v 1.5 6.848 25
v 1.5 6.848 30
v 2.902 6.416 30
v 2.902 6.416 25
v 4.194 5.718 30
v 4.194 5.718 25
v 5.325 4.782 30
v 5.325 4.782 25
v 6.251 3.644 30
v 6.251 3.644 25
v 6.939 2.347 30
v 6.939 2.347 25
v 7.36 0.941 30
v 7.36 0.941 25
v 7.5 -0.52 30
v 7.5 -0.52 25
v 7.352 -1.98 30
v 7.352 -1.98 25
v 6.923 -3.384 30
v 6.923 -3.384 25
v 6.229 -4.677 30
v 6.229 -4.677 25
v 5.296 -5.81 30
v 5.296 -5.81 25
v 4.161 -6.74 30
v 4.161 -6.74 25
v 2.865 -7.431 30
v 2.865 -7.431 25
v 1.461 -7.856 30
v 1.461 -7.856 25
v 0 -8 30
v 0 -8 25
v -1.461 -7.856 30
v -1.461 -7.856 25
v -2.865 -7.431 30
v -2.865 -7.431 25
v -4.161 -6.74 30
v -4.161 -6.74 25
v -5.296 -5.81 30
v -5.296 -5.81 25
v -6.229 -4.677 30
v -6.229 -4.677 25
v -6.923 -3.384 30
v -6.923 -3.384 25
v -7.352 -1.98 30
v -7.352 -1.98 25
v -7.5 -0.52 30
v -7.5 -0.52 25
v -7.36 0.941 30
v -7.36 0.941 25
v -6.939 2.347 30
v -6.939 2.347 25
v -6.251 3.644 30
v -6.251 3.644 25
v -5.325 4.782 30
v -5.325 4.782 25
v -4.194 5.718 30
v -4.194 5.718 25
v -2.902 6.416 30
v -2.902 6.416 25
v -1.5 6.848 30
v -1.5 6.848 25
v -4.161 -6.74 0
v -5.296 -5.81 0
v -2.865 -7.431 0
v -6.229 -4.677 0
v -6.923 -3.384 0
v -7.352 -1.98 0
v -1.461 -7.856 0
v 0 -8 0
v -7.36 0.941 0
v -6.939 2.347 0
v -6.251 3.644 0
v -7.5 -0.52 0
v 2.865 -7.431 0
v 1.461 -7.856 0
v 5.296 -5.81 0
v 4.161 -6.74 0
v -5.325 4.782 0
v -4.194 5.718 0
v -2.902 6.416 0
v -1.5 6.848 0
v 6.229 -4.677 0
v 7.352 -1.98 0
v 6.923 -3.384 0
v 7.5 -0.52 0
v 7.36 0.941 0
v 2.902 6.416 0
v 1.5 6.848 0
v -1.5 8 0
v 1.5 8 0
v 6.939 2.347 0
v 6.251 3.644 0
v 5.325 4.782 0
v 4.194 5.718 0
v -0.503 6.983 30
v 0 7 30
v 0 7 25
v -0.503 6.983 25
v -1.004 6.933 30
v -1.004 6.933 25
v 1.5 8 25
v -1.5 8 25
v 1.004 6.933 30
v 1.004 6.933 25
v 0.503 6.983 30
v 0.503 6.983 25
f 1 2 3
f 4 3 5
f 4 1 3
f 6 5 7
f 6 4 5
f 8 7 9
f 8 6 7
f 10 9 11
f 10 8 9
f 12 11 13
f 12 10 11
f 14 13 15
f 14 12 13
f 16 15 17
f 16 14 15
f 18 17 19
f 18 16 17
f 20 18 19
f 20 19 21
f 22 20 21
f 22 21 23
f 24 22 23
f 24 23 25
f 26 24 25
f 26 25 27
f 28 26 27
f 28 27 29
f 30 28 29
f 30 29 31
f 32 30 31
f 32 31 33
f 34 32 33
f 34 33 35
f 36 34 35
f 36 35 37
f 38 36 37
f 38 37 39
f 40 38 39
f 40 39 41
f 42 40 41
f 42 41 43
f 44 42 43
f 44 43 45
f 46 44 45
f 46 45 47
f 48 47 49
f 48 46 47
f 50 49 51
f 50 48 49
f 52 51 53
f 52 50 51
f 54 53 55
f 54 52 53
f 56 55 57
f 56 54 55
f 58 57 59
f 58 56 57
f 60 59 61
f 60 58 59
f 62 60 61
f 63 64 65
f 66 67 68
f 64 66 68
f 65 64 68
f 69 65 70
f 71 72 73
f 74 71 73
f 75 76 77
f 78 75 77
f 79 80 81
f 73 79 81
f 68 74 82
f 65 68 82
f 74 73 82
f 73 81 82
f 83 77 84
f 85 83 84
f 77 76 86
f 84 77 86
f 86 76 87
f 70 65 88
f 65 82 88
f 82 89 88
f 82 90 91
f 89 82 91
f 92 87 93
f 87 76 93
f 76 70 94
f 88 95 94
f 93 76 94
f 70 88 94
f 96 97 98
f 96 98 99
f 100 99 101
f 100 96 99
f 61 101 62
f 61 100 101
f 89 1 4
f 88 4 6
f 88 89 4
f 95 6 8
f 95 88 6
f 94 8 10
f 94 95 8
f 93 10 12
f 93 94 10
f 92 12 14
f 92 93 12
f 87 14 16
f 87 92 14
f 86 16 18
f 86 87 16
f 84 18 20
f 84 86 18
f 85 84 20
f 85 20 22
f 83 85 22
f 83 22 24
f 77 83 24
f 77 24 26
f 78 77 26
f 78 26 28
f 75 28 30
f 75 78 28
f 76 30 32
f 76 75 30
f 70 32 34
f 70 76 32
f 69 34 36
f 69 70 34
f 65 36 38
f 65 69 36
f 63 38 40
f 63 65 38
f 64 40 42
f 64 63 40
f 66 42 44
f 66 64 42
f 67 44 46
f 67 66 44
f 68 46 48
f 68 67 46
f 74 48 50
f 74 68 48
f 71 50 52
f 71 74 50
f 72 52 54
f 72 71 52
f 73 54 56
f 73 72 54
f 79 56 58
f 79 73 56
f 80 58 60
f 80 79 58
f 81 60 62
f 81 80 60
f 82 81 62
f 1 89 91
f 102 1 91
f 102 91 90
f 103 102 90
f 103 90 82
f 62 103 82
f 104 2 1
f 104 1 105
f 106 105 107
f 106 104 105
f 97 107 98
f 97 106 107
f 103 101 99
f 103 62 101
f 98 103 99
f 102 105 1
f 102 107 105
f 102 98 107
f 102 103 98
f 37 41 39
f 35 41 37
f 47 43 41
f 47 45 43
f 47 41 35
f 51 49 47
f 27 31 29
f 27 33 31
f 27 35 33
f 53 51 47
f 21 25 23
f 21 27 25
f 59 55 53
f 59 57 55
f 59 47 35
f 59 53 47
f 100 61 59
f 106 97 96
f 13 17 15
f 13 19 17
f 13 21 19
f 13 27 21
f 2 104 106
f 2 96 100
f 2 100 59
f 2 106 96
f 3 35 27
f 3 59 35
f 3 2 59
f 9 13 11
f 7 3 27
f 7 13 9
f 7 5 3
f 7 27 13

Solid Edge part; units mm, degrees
sketch "Sketch1" plane through (0, 0, 0) normal (0, 0, 1) x (1, 0, 0)
  circle A0 centre (0, -0.5) radius 7.5
  line L0 (1.5, 8) -> (-1.5, 8)
  line L1 (-1.5, 8) -> (-1.5, 6)
  line L2 (-1.5, 6) -> (1.5, 6)
  line L3 (1.5, 6) -> (1.5, 8)
extrude "Protrusion1" add sketch "Sketch1" along normal blind 30
sketch "Sketch2" plane through (0, 0, 30) normal (0, 0, 1) x (0, 1, 0)
  circle A0 centre (-0.5, 0) radius 9
  circle A1 centre (-0.5, 0) radius 7.5
extrude "ExtrudedCutout_3" cut sketch "Sketch2" against normal blind 5
properties material "Stainless steel"
